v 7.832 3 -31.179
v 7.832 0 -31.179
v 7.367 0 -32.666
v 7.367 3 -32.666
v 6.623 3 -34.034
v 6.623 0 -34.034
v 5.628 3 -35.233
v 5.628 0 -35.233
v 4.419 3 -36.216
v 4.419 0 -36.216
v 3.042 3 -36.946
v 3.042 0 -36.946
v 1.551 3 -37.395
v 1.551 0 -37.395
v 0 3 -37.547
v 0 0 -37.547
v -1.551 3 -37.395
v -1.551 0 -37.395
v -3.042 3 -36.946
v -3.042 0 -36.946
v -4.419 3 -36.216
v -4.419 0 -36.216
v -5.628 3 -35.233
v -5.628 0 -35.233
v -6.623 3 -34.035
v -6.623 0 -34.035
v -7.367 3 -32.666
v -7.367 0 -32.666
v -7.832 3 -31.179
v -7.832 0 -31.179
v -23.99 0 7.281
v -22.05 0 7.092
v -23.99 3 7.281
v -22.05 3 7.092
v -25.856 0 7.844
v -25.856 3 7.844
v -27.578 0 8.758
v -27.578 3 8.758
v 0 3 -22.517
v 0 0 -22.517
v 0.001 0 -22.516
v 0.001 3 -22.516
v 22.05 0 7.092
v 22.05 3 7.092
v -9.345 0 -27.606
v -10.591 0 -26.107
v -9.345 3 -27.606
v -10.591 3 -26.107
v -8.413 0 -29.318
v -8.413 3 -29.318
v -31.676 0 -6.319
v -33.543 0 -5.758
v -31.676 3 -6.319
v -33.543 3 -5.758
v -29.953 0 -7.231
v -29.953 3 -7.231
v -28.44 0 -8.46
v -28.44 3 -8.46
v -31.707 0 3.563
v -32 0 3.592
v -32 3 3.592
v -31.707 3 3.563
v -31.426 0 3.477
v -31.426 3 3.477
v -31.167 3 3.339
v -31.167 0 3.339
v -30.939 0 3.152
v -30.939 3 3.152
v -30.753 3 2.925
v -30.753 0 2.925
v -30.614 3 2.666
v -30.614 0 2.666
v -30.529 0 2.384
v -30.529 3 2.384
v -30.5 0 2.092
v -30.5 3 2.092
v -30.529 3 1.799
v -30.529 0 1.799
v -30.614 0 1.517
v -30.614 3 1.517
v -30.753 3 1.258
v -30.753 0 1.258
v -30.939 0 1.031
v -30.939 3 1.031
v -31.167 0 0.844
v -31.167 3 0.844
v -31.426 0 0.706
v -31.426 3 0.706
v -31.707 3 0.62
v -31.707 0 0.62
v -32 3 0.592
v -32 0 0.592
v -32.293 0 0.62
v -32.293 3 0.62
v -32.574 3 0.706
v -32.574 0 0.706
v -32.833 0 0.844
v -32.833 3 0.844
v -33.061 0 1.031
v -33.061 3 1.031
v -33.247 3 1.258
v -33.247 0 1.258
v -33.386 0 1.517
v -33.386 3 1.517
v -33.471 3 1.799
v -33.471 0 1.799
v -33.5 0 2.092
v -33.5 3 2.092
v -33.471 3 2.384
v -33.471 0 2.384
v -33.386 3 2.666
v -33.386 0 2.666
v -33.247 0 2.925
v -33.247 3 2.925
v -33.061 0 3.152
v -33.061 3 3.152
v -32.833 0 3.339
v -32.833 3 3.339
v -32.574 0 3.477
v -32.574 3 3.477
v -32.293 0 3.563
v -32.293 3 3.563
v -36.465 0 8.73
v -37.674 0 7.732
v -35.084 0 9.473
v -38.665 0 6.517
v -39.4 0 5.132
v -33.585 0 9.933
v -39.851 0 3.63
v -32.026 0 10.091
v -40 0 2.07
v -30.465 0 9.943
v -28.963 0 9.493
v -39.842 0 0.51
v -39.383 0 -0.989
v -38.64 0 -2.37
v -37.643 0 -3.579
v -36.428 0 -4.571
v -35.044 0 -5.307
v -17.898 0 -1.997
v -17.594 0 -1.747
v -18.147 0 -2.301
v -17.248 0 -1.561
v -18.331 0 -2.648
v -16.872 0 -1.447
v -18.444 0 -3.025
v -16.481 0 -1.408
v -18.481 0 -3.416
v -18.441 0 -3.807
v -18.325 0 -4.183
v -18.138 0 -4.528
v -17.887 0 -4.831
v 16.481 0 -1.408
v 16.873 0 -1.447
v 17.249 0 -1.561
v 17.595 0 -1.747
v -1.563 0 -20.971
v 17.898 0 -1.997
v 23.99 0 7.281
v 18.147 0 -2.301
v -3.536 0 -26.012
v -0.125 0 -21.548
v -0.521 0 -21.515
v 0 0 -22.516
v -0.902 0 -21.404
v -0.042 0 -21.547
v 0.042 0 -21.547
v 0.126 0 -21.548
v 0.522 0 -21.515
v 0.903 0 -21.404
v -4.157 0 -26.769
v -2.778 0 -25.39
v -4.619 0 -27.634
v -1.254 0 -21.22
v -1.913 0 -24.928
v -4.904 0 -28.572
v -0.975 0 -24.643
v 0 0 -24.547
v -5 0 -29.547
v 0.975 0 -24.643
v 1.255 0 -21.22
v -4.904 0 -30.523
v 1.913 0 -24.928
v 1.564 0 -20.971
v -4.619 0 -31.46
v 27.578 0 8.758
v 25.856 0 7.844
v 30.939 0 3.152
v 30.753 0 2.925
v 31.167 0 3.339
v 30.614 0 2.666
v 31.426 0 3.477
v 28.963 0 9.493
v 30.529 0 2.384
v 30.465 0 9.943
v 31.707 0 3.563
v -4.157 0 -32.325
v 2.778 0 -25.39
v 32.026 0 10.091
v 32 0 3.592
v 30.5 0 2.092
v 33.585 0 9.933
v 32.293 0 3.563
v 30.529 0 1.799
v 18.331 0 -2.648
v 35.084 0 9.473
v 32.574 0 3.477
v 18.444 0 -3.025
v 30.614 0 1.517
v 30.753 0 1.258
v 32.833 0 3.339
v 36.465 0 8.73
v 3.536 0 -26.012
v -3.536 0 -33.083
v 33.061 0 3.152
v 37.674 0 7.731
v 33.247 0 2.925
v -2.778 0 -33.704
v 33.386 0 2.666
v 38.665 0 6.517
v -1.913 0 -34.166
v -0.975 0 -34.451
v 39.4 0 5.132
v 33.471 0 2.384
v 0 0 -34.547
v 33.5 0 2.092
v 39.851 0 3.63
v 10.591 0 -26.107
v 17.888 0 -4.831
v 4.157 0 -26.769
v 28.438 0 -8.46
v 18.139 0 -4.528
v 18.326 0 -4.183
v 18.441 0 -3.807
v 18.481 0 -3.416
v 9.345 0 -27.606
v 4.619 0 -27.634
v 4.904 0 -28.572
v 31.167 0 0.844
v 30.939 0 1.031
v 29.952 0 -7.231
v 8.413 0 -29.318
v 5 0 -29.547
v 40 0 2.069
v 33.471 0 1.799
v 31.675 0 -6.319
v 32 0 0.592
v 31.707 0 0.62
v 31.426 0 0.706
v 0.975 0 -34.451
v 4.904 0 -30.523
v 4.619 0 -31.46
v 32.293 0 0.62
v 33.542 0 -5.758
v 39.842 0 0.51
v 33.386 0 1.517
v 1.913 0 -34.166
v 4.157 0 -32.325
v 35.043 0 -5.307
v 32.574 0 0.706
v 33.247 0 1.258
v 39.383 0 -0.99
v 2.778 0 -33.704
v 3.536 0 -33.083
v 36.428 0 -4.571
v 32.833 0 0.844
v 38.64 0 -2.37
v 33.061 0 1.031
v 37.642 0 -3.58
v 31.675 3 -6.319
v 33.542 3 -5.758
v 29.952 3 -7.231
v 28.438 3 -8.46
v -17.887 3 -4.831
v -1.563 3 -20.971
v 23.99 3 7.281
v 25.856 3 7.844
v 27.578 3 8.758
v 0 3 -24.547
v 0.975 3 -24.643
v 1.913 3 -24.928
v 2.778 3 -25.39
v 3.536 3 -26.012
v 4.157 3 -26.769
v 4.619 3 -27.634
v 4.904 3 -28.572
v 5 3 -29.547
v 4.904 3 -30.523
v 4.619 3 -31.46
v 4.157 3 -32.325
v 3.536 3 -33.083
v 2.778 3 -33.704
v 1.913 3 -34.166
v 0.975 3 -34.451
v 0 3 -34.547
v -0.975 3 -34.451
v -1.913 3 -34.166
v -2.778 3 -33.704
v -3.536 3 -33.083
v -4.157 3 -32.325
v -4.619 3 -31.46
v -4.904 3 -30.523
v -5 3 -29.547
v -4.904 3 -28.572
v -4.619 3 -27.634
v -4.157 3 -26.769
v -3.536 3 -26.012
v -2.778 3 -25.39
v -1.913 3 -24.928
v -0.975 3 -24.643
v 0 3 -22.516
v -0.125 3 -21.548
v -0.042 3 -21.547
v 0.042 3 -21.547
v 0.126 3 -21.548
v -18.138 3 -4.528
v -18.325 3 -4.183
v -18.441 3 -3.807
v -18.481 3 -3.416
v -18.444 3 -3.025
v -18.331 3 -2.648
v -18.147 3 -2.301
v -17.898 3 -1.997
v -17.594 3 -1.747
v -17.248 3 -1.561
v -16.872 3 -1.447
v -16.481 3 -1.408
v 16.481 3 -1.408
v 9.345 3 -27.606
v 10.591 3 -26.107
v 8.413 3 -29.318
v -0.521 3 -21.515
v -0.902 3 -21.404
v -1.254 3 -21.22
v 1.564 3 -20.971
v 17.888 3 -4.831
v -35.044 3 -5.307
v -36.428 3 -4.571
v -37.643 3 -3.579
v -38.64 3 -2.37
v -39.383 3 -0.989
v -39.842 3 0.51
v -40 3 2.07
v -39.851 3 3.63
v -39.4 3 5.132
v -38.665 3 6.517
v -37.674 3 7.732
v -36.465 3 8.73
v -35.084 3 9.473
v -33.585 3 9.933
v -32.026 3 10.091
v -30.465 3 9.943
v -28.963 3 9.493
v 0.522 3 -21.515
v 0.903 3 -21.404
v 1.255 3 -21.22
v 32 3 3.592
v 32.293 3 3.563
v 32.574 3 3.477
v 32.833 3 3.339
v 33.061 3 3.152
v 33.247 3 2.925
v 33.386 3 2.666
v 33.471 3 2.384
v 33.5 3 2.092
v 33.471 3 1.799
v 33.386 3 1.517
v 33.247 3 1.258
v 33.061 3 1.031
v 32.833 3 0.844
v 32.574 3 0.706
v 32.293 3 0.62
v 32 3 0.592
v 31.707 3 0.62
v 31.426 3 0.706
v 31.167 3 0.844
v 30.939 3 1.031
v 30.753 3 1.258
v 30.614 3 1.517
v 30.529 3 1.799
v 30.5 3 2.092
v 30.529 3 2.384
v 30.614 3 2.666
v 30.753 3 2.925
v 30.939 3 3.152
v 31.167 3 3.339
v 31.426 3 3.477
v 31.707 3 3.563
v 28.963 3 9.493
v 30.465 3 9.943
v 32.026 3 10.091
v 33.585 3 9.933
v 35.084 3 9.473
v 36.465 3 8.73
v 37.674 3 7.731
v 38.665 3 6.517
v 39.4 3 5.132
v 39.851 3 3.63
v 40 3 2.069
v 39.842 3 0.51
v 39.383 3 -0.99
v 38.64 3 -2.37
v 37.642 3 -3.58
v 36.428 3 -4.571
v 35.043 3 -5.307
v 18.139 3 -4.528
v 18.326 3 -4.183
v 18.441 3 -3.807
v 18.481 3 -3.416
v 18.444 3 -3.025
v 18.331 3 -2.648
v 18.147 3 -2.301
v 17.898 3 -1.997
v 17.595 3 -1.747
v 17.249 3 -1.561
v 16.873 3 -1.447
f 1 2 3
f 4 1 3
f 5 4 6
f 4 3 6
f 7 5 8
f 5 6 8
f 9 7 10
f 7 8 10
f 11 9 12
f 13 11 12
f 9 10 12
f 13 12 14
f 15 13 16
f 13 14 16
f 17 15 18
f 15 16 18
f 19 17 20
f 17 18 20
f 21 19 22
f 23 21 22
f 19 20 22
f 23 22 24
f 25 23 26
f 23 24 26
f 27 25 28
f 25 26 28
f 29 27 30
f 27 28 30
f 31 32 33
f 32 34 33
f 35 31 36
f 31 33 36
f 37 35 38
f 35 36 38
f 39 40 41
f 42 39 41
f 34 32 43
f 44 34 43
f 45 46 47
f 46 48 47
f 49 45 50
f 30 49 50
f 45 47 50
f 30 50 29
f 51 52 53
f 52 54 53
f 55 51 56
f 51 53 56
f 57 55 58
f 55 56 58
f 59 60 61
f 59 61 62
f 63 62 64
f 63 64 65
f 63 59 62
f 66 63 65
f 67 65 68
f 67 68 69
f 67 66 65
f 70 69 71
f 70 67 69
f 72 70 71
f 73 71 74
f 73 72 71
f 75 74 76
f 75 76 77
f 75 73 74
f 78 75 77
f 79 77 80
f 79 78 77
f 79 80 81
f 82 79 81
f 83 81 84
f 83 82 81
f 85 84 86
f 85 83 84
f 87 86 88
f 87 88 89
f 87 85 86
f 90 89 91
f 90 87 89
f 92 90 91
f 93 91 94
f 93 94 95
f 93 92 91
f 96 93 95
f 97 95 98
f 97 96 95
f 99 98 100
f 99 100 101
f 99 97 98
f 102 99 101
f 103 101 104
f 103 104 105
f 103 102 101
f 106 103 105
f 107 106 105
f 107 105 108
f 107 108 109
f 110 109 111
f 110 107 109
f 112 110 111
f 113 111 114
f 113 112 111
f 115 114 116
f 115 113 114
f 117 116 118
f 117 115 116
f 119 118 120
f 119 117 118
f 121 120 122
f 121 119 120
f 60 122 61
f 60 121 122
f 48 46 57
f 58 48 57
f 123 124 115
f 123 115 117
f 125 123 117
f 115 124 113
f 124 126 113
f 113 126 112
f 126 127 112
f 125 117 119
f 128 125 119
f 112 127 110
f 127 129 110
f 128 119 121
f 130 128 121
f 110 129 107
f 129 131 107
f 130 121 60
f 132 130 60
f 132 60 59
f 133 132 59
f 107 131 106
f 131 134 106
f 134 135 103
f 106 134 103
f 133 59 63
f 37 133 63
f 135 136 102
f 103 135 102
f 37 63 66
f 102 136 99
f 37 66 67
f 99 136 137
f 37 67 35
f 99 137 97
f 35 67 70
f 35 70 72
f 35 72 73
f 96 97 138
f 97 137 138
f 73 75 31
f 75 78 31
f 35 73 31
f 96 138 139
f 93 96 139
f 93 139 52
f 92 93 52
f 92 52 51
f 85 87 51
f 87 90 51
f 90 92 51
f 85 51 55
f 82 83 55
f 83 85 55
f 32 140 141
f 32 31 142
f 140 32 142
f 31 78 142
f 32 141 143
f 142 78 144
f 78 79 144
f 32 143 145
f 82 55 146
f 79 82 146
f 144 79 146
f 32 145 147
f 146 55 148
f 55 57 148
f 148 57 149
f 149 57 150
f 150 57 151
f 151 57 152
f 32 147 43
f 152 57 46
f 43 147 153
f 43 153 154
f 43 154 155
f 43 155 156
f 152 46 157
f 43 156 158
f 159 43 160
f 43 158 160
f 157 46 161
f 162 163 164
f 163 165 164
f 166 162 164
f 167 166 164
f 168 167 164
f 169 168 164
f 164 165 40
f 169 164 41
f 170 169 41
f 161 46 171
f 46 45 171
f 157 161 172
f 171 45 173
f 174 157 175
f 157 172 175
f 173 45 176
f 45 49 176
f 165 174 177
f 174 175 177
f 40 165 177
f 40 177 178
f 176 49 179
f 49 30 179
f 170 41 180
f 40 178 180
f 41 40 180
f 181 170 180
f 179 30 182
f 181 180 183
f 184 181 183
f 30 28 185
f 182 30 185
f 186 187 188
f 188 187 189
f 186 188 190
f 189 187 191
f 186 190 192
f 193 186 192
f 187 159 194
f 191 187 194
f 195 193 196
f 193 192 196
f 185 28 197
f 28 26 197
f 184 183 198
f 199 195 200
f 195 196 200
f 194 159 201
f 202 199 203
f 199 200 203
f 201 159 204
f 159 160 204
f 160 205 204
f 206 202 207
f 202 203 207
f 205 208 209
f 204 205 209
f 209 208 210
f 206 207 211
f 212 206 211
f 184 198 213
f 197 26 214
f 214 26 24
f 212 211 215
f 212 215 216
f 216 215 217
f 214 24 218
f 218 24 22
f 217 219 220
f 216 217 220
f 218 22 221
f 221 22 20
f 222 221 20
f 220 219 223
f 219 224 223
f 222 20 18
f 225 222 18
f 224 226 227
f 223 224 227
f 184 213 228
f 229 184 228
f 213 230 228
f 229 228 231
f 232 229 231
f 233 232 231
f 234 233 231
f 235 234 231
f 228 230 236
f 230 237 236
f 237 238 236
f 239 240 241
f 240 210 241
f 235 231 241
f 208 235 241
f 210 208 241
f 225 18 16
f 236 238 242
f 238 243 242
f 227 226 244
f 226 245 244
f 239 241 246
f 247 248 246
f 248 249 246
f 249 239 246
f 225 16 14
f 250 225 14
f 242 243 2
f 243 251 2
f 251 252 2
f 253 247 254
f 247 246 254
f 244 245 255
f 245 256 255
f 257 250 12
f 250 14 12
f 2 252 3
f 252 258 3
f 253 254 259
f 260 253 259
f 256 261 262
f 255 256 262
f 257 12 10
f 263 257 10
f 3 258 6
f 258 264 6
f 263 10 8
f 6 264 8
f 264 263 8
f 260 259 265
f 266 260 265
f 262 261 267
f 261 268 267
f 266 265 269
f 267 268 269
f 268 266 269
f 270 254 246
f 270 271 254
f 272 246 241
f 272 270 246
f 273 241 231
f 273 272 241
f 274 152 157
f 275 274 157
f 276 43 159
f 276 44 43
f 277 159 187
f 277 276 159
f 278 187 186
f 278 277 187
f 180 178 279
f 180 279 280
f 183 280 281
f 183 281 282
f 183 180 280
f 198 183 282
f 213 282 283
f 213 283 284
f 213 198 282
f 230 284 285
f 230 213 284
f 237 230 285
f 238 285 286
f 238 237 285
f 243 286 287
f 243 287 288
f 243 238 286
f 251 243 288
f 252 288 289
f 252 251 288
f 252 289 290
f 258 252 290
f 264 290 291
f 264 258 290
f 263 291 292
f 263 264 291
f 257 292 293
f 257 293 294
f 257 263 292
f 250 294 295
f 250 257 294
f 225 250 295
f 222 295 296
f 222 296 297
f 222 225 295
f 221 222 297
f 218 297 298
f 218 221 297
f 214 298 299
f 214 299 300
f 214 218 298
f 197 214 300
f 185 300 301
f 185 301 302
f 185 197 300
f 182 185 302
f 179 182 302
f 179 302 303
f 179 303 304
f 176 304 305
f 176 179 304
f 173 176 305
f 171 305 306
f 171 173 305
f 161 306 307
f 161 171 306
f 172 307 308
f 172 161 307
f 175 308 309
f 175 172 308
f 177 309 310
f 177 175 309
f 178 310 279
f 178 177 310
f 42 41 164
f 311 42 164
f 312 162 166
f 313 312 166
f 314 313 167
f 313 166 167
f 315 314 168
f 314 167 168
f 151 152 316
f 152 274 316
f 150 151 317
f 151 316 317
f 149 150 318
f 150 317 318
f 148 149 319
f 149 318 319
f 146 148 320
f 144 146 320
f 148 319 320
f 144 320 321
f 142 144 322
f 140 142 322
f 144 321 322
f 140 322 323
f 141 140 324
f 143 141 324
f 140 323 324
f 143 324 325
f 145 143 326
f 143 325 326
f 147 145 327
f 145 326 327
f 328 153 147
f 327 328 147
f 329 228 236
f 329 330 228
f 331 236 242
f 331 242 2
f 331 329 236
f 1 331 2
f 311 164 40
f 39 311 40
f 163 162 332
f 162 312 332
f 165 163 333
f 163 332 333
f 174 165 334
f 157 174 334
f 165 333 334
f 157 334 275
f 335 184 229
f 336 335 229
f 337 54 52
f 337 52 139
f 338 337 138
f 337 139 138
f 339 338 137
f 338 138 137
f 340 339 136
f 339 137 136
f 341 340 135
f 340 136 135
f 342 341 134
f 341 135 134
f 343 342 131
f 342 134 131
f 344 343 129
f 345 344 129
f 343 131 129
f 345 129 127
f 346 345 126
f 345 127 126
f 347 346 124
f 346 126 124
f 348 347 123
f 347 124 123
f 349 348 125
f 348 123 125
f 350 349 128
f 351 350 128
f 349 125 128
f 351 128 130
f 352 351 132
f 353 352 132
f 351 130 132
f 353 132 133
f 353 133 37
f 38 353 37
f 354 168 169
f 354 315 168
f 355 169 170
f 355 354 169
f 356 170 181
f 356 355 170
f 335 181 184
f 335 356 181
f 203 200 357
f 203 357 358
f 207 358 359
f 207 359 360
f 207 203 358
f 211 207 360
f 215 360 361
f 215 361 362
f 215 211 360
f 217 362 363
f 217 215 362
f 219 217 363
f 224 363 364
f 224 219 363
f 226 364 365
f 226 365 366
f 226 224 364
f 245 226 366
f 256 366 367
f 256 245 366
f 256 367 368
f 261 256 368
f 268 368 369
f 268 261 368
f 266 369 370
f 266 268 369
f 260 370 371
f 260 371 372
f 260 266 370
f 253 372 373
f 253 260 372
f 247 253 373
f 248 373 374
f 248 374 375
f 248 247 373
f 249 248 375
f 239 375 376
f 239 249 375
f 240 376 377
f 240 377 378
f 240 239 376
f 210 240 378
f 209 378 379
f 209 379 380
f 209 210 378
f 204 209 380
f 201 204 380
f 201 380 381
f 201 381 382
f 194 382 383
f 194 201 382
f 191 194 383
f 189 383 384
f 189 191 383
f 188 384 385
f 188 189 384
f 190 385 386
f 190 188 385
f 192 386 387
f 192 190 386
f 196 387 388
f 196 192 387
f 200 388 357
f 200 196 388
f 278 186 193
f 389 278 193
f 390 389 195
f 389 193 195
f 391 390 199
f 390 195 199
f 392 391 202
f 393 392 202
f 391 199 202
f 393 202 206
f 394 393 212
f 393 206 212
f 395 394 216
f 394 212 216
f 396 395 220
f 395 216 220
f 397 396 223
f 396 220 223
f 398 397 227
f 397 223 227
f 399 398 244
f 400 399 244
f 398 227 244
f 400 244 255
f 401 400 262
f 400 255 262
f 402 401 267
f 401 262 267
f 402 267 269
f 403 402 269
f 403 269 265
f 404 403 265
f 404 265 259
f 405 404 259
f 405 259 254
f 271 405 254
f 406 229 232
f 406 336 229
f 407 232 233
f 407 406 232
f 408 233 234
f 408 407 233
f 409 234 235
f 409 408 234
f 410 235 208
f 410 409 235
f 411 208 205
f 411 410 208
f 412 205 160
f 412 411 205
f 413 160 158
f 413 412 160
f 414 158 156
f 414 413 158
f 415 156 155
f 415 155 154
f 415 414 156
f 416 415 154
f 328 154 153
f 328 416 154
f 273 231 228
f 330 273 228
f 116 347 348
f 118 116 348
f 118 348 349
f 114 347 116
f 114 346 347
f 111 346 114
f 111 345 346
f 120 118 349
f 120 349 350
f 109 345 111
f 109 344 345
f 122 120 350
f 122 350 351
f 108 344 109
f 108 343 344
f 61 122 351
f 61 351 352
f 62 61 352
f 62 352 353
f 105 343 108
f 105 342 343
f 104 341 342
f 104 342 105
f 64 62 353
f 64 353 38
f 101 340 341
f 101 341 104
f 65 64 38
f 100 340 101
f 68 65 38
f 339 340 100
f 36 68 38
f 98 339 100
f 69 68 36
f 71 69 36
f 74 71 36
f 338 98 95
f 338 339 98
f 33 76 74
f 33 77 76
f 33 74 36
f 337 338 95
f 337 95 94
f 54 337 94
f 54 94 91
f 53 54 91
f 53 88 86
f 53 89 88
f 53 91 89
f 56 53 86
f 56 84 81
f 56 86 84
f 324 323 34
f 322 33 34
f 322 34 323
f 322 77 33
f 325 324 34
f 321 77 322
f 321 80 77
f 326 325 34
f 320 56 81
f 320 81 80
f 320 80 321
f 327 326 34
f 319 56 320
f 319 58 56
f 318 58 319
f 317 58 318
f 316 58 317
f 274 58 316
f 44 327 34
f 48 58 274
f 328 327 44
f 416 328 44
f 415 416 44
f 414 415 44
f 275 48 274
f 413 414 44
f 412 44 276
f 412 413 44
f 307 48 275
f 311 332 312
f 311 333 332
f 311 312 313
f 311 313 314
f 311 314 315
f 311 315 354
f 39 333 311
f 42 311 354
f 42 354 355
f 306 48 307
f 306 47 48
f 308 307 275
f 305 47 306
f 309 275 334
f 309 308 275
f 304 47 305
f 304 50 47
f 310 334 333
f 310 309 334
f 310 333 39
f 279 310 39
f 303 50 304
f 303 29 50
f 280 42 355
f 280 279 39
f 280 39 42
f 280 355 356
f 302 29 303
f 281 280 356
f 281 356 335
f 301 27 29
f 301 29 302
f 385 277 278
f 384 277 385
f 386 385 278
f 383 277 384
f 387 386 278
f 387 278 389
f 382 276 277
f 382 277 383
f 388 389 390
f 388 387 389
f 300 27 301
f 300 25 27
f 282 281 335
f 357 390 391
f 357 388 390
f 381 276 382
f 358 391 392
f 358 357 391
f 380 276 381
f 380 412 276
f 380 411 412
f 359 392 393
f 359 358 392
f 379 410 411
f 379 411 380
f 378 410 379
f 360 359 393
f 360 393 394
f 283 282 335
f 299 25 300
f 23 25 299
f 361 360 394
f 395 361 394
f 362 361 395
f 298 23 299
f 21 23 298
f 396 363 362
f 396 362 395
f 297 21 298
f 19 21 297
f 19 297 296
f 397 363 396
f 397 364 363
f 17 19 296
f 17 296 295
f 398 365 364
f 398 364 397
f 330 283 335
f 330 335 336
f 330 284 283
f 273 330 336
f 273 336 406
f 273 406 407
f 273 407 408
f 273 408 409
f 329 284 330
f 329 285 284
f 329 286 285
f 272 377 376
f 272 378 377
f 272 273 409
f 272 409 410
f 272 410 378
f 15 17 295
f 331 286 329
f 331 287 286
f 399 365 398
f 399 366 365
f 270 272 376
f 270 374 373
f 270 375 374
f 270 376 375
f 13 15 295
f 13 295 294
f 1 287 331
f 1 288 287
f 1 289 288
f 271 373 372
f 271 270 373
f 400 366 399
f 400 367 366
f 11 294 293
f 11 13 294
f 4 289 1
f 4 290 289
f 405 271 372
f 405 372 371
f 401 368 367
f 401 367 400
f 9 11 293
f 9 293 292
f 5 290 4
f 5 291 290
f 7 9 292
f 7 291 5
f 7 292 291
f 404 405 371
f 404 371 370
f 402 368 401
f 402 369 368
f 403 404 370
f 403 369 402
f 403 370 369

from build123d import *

# Parameters (mm, degrees)
SKETCH2_R           = 1.5
SKETCH2_R_2         = 5
BOSS_EXTRUDE1_DEPTH = 3
FILLET1_R           = 10
FILLET2_R           = 2


with BuildPart() as part:
    # Sketch2 → Boss-Extrude1 (new body)
    with BuildSketch(Plane(origin=(0, 0, 0), x_dir=(1, 0, 0), z_dir=(0, 1, 0))):
        with BuildLine():
            Line((-25.755002002, -7.091520556), (25.755002002, -7.091520556))
            ThreePointArc((25.755002002, -7.091520556), (39.399896119, -5.131510265), (31.07348397, 5.854646321))
            Line((31.07348397, 5.854646321), (7.956268299, 28.711722383))
            ThreePointArc((7.956268299, 28.711722383), (8.3294e-05, 37.547063483), (-7.956285692, 28.711888061))
            Line((-7.956285692, 28.711888061), (-31.074510761, 5.854765977))
            ThreePointArc((-31.074510761, 5.854765977), (-39.399699694, -5.131988356), (-25.755002002, -7.091520556))
        make_face()
        with Locations(Location((-32, -2.091520556, 0), (0, 0, 270))):
            Circle(SKETCH2_R, mode=Mode.SUBTRACT)
        with Locations(Location((32, -2.091520556, 0), (0, 0, 270))):
            Circle(SKETCH2_R, mode=Mode.SUBTRACT)
        with BuildLine():
            Line((0.92651603, 21.600896605), (21.348745942, 1.408479444))
            Line((21.348745942, 1.408479444), (-21.34844873, 1.408479444))
            Line((-21.34844873, 1.408479444), (-0.925489239, 21.60077695))
            ThreePointArc((-0.925489239, 21.60077695), (0.00051687, 21.5470635), (0.92651603, 21.600896605))
        make_face(mode=Mode.SUBTRACT)
        Polygon((0, 22.515813483), (0, 22.516986487), (0.000593189, 22.516399973), align=None, mode=Mode.SUBTRACT)
        with Locations(Location((0, 29.547063483, 0), (0, 0, 270))):
            Circle(SKETCH2_R_2, mode=Mode.SUBTRACT)
    extrude(amount=BOSS_EXTRUDE1_DEPTH)

    # Fillet1
    fillet1_edges = [part.edges().sort_by_distance(p)[0] for p in [
        (-25.755002002, 1.5, 7.091520556),
        (-31.074510761, 1.5, -5.854765977),
        (-7.956285692, 1.5, -28.711888061),
        (7.956268299, 1.5, -28.711722383),
        (31.07348397, 1.5, -5.854646321),
        (25.755002002, 1.5, 7.091520556),
    ]]
    fillet(fillet1_edges, radius=FILLET1_R)

    # Fillet2
    fillet2_edges = [part.edges().sort_by_distance(p)[0] for p in [
        (0.92651603, 1.5, -21.600896605),
        (-0.925489239, 1.5, -21.60077695),
        (-21.34844873, 1.5, -1.408479444),
        (21.348745942, 1.5, -1.408479444),
    ]]
    fillet(fillet2_edges, radius=FILLET2_R)


solid = part.part
